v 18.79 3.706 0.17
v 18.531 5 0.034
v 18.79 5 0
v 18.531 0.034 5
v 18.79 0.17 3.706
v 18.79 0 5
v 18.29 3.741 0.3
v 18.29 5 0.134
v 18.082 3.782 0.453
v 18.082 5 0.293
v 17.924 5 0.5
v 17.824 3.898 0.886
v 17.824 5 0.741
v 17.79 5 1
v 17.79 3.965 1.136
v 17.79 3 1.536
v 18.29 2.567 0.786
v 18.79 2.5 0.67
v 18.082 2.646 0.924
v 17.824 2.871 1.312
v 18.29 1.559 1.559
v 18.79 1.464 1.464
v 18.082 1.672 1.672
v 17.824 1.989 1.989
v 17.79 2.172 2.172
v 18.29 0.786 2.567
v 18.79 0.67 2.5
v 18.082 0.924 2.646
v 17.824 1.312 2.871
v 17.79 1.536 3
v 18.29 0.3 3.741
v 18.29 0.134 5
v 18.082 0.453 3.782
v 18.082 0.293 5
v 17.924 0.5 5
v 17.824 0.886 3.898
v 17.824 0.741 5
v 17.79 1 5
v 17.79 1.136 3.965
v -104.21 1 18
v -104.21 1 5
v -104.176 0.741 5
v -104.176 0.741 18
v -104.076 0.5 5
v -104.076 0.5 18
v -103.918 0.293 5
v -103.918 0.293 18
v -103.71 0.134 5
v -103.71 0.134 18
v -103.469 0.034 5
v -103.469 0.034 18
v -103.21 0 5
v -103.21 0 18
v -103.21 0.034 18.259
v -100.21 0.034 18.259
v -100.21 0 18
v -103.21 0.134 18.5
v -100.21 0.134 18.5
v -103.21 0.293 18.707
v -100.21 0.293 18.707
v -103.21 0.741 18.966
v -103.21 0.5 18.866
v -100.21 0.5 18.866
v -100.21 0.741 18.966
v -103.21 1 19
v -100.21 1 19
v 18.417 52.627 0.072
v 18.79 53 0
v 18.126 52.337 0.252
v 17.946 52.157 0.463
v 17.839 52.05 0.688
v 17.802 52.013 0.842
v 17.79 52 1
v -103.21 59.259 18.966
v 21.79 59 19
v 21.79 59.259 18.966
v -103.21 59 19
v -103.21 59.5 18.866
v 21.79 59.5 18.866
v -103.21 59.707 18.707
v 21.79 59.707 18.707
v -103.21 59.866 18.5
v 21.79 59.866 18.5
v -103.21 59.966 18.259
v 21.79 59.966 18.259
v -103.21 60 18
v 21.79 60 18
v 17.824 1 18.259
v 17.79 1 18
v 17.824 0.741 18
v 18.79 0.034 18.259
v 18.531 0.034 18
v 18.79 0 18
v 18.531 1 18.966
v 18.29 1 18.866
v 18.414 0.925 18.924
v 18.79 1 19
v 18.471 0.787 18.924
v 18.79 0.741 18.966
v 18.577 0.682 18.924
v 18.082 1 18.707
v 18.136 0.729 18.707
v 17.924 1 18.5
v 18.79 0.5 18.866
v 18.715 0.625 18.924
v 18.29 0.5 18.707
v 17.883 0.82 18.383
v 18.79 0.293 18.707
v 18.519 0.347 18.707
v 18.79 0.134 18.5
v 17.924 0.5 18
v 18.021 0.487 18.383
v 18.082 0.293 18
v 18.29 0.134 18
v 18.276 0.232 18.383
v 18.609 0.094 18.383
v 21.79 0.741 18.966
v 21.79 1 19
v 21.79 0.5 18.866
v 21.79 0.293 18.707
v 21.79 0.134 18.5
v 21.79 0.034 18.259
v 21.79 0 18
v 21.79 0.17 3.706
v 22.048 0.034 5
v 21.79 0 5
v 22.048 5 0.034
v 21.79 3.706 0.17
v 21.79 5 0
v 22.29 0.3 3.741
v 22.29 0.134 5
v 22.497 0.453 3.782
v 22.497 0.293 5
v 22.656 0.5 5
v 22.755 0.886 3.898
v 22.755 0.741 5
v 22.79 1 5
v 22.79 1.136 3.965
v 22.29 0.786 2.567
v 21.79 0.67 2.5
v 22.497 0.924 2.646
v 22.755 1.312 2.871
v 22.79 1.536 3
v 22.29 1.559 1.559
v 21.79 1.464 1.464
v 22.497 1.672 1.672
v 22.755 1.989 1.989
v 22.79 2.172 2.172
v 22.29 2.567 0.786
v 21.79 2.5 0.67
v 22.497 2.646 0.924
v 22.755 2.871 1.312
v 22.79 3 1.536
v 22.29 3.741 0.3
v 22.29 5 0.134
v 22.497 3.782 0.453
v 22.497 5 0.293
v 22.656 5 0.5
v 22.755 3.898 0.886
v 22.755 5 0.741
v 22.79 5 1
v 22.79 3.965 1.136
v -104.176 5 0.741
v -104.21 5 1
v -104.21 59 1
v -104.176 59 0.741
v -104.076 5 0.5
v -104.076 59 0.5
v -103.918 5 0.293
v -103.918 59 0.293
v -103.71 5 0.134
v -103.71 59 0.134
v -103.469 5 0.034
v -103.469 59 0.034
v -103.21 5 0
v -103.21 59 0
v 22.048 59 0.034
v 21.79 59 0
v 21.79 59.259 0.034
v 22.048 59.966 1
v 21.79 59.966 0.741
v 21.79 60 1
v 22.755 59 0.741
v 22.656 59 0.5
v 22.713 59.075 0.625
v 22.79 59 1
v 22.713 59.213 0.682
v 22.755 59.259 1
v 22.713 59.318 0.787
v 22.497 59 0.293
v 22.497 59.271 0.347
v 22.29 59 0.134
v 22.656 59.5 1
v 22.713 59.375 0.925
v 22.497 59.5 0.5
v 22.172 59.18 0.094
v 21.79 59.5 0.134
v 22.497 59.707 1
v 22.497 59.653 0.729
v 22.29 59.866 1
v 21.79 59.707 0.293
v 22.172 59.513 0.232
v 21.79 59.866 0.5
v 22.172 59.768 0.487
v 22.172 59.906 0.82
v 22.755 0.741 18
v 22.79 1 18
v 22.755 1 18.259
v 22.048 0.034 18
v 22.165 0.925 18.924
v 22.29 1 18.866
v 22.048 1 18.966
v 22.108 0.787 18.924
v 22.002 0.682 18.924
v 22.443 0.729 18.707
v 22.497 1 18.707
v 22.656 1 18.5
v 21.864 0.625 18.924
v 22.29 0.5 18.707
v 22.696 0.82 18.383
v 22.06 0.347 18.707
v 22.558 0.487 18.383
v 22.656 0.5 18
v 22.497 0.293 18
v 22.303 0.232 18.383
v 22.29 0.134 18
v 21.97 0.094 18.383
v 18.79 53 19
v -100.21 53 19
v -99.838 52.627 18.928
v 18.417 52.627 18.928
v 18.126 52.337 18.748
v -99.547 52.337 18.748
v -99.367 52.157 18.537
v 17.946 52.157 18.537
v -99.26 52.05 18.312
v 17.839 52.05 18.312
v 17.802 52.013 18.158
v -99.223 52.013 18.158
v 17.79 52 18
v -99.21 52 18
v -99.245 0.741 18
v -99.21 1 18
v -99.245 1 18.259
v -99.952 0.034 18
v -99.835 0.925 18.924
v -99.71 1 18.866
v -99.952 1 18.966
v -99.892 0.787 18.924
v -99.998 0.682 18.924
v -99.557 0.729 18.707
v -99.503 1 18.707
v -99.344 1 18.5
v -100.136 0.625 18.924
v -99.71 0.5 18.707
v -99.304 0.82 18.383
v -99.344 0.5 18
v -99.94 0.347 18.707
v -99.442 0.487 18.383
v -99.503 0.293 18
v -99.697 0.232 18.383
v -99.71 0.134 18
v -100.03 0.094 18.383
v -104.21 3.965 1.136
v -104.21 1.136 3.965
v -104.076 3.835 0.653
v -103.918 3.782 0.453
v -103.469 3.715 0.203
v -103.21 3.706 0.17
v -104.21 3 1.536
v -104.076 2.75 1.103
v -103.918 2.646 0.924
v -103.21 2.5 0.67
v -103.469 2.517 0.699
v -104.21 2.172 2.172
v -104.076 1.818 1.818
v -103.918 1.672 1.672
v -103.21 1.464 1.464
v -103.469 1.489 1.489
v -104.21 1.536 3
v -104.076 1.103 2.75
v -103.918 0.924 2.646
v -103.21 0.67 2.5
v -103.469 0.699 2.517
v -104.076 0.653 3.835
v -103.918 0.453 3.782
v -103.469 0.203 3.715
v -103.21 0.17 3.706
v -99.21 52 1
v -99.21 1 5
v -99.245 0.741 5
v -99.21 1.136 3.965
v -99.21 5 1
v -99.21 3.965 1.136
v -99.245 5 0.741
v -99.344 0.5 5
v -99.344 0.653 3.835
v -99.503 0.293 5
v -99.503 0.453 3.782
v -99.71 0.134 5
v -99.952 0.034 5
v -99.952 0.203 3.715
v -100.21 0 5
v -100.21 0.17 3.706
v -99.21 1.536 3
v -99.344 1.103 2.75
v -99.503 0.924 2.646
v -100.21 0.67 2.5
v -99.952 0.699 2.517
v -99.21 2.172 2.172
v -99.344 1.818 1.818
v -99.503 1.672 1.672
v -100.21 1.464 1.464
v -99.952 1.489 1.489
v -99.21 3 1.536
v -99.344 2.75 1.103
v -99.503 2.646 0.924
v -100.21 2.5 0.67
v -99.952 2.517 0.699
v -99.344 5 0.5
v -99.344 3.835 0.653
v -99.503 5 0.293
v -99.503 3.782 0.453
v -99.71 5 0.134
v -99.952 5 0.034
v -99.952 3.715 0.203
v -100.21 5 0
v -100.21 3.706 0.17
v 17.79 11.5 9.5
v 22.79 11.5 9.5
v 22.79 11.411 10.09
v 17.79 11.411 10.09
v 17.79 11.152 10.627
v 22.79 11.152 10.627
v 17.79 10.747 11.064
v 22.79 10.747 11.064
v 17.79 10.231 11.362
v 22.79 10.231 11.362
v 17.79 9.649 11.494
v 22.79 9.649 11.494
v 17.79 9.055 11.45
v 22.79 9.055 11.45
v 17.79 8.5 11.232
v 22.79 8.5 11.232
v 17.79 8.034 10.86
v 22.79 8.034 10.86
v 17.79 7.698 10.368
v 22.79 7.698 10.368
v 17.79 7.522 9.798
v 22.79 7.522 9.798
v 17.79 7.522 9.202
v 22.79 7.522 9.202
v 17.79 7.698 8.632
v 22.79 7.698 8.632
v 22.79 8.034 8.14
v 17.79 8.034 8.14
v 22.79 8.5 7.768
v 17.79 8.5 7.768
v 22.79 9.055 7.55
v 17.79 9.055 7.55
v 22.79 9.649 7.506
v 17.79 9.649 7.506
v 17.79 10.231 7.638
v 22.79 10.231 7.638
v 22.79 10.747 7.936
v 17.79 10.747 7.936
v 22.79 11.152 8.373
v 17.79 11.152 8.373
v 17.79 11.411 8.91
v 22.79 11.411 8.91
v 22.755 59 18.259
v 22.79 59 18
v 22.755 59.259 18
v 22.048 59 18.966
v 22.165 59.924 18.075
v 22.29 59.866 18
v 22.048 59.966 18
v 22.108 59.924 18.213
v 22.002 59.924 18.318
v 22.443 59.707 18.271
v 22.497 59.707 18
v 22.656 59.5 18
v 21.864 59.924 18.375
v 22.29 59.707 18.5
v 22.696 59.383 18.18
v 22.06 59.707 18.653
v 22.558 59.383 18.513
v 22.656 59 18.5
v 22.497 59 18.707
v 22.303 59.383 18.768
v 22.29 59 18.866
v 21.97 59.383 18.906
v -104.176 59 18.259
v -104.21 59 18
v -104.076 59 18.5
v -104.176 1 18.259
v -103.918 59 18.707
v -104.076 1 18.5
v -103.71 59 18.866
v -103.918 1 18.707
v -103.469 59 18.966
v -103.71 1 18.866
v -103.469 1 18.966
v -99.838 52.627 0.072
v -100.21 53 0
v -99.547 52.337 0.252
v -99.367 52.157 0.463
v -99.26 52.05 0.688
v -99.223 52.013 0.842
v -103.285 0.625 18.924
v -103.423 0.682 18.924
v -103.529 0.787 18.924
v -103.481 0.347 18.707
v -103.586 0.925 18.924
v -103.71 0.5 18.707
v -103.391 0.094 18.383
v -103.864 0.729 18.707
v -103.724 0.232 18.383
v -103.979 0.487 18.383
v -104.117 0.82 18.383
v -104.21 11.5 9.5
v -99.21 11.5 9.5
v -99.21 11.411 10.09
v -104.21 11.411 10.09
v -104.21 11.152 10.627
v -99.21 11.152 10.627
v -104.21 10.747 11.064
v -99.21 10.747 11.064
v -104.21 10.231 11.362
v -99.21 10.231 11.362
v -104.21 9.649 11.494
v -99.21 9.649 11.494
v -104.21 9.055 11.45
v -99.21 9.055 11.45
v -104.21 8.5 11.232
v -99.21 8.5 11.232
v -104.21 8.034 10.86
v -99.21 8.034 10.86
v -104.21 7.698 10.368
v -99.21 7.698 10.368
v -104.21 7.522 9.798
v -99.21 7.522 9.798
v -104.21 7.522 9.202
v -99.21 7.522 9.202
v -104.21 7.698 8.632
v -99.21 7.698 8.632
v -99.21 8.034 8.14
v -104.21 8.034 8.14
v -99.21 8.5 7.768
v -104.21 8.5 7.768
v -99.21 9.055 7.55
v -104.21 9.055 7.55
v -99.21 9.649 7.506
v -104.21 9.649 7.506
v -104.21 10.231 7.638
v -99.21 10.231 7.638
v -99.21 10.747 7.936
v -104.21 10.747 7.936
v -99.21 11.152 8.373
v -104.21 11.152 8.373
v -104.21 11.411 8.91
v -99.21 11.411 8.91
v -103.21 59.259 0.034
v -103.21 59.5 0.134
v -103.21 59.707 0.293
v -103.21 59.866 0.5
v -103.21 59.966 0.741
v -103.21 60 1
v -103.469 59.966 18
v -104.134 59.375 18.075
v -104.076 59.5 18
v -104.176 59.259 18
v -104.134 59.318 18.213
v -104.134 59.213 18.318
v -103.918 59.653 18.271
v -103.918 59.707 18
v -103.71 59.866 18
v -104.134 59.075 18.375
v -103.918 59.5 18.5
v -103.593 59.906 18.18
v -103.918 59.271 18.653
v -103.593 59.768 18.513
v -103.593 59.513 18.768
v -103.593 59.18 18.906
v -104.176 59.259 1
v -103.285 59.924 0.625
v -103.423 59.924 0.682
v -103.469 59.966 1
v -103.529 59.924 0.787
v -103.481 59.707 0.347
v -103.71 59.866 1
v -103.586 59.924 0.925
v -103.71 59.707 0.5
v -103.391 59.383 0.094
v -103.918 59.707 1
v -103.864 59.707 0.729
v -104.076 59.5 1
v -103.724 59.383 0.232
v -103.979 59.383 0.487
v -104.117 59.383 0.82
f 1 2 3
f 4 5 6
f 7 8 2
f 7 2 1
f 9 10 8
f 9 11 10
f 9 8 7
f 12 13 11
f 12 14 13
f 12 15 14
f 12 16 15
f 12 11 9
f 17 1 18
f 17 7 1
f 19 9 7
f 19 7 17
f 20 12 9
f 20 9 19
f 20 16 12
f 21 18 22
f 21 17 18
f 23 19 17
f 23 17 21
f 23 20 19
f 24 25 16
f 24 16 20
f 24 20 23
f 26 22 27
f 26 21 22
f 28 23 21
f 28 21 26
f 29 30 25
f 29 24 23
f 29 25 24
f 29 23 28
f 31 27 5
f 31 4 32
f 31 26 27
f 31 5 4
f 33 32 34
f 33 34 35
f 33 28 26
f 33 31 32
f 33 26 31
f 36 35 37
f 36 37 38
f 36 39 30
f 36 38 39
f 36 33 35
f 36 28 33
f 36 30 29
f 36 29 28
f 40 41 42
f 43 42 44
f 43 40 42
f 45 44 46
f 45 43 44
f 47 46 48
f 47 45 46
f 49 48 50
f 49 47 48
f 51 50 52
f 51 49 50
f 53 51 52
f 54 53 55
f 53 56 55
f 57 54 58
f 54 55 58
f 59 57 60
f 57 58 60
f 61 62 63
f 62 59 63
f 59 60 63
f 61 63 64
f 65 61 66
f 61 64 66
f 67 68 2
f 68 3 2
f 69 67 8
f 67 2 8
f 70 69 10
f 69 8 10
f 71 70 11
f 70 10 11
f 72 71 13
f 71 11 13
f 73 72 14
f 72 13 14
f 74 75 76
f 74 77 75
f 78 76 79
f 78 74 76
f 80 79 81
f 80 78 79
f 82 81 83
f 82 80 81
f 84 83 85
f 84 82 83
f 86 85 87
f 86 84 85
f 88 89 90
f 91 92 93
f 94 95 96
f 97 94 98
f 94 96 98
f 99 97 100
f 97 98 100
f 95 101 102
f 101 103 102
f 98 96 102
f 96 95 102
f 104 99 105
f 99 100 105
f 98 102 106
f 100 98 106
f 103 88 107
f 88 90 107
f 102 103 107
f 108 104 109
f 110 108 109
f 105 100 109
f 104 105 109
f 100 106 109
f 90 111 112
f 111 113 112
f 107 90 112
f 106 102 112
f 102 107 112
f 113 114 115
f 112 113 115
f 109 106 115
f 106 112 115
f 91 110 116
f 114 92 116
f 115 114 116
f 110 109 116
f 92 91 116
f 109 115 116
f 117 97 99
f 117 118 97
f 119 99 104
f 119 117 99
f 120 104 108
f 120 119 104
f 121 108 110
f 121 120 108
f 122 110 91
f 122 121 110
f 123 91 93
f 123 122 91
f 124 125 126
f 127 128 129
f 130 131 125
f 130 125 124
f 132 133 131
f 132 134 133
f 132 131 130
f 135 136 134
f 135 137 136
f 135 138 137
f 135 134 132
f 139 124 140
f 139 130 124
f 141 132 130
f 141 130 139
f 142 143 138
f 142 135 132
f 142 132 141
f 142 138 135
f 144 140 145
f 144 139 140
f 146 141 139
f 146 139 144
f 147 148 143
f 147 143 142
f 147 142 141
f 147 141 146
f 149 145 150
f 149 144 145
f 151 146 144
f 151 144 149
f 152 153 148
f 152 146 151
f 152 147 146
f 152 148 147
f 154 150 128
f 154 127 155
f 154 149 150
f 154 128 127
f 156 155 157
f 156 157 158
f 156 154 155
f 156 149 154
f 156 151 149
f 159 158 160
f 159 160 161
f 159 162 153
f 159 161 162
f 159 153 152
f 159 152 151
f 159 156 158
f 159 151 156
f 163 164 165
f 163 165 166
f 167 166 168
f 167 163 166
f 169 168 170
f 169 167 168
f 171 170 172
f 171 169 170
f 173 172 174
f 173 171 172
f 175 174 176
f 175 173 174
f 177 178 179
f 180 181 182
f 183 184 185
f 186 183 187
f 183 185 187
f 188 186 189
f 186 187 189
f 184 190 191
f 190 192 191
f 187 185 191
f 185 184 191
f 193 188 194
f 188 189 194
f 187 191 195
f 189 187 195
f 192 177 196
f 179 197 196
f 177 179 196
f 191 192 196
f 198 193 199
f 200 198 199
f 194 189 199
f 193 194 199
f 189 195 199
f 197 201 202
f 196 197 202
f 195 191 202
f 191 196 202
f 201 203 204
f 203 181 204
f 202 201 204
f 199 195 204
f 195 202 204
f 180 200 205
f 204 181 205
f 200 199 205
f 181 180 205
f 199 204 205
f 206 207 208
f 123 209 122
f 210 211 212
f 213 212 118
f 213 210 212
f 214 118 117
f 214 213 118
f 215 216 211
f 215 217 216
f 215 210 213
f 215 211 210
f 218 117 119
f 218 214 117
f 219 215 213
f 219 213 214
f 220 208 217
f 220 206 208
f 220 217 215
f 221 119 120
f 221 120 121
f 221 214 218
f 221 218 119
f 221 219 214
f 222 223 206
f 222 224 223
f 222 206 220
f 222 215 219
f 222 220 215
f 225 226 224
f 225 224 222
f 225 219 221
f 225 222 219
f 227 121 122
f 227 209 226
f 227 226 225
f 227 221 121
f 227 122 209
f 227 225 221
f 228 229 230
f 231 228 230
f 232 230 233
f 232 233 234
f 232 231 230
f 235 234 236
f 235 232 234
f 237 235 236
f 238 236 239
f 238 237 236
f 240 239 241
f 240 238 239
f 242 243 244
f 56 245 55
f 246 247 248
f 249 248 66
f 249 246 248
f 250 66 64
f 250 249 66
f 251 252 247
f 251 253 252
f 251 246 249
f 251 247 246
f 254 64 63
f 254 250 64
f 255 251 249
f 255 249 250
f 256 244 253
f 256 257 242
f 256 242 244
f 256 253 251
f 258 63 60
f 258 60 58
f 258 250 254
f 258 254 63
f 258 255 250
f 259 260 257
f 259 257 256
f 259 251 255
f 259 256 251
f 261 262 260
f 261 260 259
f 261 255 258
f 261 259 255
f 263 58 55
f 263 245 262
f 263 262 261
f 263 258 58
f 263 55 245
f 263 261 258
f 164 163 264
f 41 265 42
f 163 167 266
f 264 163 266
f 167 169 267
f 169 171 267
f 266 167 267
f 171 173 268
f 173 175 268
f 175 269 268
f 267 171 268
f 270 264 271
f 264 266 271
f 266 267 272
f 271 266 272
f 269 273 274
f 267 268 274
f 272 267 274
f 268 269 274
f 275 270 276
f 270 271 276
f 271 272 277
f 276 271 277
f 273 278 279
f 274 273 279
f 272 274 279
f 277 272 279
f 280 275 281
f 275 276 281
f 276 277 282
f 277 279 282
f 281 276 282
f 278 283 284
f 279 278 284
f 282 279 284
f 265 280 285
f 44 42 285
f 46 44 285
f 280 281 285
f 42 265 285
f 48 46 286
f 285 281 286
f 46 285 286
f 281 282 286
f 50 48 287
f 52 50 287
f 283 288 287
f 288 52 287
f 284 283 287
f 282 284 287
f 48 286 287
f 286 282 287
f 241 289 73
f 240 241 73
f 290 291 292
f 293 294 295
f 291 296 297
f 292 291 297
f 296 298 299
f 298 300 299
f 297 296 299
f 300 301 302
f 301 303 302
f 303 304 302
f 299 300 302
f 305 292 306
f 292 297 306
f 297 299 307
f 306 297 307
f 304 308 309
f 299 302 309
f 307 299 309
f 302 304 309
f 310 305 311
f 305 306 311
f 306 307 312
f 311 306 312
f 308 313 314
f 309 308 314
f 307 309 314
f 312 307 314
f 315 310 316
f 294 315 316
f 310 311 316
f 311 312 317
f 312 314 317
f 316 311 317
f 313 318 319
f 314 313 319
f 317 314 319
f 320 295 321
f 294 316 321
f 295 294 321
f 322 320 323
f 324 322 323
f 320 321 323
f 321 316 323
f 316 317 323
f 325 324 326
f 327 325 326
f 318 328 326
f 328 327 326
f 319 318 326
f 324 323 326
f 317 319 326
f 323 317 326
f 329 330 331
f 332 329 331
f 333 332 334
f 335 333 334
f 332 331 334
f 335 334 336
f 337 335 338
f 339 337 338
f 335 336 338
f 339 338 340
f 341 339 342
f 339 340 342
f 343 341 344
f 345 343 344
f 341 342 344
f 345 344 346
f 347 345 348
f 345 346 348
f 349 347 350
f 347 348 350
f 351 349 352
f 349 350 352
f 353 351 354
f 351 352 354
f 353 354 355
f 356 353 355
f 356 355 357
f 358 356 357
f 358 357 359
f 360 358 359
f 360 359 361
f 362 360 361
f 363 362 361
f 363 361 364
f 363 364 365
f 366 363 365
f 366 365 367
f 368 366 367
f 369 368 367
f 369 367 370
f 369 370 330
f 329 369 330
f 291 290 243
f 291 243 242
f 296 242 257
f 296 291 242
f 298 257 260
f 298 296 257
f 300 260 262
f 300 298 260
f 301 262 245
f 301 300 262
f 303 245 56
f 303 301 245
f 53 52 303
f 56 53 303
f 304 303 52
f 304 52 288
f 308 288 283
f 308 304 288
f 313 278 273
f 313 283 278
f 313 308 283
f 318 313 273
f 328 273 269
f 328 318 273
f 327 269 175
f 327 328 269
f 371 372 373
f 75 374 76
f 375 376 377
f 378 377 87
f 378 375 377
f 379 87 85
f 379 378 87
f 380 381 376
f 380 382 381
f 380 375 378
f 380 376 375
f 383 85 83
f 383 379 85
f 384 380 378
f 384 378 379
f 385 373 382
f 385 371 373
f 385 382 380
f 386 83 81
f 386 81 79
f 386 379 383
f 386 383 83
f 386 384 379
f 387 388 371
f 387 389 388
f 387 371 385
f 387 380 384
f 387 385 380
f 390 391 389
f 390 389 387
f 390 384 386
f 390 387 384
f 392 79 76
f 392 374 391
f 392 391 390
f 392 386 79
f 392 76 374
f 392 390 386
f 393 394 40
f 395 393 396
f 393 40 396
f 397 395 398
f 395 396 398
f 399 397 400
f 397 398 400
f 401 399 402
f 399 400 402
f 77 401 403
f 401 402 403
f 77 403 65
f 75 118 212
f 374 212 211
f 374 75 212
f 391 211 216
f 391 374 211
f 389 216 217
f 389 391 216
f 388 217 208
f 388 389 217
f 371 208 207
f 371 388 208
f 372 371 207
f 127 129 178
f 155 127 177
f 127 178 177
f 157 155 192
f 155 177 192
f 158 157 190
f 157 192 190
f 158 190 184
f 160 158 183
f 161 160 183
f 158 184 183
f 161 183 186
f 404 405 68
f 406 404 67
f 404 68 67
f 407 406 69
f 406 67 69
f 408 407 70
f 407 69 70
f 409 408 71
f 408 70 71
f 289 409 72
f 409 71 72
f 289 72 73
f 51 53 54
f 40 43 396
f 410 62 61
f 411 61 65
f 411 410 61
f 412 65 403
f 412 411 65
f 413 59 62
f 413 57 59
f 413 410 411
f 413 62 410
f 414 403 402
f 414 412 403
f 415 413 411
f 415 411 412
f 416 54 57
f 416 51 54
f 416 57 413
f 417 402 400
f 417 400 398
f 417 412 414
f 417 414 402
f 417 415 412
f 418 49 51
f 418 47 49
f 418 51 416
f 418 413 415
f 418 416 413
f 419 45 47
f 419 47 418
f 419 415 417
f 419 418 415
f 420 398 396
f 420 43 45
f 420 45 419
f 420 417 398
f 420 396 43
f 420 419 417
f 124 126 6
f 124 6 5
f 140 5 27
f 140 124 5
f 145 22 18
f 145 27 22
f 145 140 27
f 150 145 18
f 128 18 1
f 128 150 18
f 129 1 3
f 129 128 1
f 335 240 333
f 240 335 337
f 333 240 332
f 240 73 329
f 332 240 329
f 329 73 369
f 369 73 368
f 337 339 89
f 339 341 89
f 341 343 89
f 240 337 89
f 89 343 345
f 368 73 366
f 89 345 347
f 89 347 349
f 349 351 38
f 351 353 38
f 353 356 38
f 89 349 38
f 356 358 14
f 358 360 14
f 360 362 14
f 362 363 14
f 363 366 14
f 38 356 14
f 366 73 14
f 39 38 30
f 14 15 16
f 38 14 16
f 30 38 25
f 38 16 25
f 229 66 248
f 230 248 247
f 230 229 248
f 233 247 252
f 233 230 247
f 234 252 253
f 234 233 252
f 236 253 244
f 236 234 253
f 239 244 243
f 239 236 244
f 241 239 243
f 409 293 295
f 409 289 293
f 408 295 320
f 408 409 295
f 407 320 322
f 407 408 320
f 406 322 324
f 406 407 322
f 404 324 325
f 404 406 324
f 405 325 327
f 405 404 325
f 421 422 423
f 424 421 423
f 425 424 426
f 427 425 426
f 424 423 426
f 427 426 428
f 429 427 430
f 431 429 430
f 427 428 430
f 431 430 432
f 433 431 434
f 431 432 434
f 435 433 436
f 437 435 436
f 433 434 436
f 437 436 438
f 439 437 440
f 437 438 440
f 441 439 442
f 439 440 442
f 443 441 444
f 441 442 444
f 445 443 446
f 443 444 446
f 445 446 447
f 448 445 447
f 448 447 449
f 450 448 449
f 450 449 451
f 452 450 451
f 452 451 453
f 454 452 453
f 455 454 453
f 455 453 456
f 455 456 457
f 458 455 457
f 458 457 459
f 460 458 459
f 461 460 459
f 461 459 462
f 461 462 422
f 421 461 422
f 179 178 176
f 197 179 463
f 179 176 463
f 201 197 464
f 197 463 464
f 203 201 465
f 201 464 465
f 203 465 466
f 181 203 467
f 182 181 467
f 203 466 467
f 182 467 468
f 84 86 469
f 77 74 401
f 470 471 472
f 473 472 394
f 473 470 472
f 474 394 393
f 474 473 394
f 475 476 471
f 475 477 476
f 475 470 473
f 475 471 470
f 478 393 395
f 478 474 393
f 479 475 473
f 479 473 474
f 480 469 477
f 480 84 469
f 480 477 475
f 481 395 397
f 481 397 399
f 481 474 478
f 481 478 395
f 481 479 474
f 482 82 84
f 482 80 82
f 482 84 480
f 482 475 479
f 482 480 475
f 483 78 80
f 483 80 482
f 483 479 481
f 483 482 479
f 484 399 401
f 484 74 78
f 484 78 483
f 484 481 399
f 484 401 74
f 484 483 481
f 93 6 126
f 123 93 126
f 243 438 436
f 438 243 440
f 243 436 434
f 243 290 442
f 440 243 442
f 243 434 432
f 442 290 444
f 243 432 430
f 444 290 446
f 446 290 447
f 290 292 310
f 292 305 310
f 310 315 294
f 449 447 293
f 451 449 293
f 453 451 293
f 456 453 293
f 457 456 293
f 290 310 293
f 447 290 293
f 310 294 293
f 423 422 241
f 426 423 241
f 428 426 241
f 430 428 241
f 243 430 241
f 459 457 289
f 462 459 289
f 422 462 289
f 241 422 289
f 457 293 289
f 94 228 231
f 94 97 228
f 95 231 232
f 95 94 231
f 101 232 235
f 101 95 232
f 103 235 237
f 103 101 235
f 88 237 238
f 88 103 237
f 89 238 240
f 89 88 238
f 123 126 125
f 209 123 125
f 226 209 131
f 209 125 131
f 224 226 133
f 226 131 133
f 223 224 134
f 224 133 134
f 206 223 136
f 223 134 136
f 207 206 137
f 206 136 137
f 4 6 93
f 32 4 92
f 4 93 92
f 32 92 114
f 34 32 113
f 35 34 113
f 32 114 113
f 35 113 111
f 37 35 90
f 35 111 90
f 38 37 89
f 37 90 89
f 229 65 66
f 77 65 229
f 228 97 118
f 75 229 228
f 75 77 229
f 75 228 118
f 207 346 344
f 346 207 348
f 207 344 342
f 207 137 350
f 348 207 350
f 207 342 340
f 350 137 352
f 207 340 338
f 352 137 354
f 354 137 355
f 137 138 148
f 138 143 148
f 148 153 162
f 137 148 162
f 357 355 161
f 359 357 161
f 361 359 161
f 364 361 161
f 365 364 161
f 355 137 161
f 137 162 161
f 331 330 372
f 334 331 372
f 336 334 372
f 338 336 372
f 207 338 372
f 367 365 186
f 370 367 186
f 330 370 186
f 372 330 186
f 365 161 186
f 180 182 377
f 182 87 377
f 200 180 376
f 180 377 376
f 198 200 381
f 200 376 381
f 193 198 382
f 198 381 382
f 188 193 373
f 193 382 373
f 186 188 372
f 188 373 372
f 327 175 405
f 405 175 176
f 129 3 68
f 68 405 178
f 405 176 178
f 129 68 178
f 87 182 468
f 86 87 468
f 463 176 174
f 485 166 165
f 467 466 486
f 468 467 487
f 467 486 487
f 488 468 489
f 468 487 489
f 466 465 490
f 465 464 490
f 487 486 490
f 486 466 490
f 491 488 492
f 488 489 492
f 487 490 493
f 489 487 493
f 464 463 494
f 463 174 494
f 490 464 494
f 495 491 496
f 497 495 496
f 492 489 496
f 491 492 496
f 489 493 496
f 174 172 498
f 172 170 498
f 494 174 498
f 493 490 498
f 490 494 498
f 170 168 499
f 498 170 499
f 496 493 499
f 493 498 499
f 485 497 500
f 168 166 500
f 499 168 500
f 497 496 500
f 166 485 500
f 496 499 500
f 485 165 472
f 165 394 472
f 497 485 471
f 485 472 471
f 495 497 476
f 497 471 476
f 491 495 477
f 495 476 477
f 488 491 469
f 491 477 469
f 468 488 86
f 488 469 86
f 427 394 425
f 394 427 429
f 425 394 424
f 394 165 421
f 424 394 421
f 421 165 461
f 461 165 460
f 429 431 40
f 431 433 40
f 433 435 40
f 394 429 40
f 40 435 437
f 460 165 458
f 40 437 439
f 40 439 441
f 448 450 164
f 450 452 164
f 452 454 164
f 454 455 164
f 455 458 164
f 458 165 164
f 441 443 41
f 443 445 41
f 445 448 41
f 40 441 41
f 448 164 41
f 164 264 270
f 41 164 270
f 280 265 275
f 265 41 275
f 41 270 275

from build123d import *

# Parameters (mm, degrees)
PAD_DEPTH    = 19
FILLET_R     = 5
FILLET001_R  = 1
SKETCH001_R  = 2
POCKET_DEPTH = 127.001


with BuildPart() as part:
    # Sketch → Pad (new body)
    with BuildSketch(Plane.XY):
        Polygon((-104.21047, 0), (-99.21047, 0), (-99.21047, 52), (17.78953, 52), (17.78953, 0), (22.78953, 0), (22.78953, 60), (-104.21047, 60), align=None)
    extrude(amount=PAD_DEPTH)

    # Fillet
    fillet_edges = [part.edges().sort_by_distance(p)[0] for p in [
        (-101.71047, 0, 0),
        (20.28953, 0, 0),
    ]]
    fillet(fillet_edges, radius=FILLET_R)

    # Fillet001
    fillet001_edges = [part.edges().sort_by_distance(p)[0] for p in [
        (-40.71047, 52, 0),
        (17.78953, 28.5, 0),
        (-99.21047, 28.5, 0),
        (-99.21047, 26, 19),
        (-40.71047, 52, 19),
        (-104.21047, 32.5, 0),
        (-40.71047, 60, 0),
        (22.78953, 32.5, 0),
        (22.78953, 1.464466, 1.464466),
        (17.78953, 1.464466, 1.464466),
        (22.78953, 30, 19),
        (22.78953, 60, 9.5),
        (-40.71047, 60, 19),
        (-104.21047, 60, 9.5),
        (17.78953, 26, 19),
        (20.28953, 0, 19),
        (-101.71047, 0, 19),
        (-104.21047, 0, 12),
        (-99.21047, 0, 12),
        (-104.21047, 30, 19),
        (22.78953, 0, 12),
        (17.78953, 0, 12),
        (-104.21047, 1.464466, 1.464466),
        (-99.21047, 1.464466, 1.464466),
    ]]
    fillet(fillet001_edges, radius=FILLET001_R)

    # Sketch001 → Pocket (cut, through all)
    with BuildSketch(Plane.YZ.offset(22.78953)):
        with Locations((9.5, 9.5)):
            Circle(SKETCH001_R)
    extrude(amount=-POCKET_DEPTH, mode=Mode.SUBTRACT)


solid = part.part
